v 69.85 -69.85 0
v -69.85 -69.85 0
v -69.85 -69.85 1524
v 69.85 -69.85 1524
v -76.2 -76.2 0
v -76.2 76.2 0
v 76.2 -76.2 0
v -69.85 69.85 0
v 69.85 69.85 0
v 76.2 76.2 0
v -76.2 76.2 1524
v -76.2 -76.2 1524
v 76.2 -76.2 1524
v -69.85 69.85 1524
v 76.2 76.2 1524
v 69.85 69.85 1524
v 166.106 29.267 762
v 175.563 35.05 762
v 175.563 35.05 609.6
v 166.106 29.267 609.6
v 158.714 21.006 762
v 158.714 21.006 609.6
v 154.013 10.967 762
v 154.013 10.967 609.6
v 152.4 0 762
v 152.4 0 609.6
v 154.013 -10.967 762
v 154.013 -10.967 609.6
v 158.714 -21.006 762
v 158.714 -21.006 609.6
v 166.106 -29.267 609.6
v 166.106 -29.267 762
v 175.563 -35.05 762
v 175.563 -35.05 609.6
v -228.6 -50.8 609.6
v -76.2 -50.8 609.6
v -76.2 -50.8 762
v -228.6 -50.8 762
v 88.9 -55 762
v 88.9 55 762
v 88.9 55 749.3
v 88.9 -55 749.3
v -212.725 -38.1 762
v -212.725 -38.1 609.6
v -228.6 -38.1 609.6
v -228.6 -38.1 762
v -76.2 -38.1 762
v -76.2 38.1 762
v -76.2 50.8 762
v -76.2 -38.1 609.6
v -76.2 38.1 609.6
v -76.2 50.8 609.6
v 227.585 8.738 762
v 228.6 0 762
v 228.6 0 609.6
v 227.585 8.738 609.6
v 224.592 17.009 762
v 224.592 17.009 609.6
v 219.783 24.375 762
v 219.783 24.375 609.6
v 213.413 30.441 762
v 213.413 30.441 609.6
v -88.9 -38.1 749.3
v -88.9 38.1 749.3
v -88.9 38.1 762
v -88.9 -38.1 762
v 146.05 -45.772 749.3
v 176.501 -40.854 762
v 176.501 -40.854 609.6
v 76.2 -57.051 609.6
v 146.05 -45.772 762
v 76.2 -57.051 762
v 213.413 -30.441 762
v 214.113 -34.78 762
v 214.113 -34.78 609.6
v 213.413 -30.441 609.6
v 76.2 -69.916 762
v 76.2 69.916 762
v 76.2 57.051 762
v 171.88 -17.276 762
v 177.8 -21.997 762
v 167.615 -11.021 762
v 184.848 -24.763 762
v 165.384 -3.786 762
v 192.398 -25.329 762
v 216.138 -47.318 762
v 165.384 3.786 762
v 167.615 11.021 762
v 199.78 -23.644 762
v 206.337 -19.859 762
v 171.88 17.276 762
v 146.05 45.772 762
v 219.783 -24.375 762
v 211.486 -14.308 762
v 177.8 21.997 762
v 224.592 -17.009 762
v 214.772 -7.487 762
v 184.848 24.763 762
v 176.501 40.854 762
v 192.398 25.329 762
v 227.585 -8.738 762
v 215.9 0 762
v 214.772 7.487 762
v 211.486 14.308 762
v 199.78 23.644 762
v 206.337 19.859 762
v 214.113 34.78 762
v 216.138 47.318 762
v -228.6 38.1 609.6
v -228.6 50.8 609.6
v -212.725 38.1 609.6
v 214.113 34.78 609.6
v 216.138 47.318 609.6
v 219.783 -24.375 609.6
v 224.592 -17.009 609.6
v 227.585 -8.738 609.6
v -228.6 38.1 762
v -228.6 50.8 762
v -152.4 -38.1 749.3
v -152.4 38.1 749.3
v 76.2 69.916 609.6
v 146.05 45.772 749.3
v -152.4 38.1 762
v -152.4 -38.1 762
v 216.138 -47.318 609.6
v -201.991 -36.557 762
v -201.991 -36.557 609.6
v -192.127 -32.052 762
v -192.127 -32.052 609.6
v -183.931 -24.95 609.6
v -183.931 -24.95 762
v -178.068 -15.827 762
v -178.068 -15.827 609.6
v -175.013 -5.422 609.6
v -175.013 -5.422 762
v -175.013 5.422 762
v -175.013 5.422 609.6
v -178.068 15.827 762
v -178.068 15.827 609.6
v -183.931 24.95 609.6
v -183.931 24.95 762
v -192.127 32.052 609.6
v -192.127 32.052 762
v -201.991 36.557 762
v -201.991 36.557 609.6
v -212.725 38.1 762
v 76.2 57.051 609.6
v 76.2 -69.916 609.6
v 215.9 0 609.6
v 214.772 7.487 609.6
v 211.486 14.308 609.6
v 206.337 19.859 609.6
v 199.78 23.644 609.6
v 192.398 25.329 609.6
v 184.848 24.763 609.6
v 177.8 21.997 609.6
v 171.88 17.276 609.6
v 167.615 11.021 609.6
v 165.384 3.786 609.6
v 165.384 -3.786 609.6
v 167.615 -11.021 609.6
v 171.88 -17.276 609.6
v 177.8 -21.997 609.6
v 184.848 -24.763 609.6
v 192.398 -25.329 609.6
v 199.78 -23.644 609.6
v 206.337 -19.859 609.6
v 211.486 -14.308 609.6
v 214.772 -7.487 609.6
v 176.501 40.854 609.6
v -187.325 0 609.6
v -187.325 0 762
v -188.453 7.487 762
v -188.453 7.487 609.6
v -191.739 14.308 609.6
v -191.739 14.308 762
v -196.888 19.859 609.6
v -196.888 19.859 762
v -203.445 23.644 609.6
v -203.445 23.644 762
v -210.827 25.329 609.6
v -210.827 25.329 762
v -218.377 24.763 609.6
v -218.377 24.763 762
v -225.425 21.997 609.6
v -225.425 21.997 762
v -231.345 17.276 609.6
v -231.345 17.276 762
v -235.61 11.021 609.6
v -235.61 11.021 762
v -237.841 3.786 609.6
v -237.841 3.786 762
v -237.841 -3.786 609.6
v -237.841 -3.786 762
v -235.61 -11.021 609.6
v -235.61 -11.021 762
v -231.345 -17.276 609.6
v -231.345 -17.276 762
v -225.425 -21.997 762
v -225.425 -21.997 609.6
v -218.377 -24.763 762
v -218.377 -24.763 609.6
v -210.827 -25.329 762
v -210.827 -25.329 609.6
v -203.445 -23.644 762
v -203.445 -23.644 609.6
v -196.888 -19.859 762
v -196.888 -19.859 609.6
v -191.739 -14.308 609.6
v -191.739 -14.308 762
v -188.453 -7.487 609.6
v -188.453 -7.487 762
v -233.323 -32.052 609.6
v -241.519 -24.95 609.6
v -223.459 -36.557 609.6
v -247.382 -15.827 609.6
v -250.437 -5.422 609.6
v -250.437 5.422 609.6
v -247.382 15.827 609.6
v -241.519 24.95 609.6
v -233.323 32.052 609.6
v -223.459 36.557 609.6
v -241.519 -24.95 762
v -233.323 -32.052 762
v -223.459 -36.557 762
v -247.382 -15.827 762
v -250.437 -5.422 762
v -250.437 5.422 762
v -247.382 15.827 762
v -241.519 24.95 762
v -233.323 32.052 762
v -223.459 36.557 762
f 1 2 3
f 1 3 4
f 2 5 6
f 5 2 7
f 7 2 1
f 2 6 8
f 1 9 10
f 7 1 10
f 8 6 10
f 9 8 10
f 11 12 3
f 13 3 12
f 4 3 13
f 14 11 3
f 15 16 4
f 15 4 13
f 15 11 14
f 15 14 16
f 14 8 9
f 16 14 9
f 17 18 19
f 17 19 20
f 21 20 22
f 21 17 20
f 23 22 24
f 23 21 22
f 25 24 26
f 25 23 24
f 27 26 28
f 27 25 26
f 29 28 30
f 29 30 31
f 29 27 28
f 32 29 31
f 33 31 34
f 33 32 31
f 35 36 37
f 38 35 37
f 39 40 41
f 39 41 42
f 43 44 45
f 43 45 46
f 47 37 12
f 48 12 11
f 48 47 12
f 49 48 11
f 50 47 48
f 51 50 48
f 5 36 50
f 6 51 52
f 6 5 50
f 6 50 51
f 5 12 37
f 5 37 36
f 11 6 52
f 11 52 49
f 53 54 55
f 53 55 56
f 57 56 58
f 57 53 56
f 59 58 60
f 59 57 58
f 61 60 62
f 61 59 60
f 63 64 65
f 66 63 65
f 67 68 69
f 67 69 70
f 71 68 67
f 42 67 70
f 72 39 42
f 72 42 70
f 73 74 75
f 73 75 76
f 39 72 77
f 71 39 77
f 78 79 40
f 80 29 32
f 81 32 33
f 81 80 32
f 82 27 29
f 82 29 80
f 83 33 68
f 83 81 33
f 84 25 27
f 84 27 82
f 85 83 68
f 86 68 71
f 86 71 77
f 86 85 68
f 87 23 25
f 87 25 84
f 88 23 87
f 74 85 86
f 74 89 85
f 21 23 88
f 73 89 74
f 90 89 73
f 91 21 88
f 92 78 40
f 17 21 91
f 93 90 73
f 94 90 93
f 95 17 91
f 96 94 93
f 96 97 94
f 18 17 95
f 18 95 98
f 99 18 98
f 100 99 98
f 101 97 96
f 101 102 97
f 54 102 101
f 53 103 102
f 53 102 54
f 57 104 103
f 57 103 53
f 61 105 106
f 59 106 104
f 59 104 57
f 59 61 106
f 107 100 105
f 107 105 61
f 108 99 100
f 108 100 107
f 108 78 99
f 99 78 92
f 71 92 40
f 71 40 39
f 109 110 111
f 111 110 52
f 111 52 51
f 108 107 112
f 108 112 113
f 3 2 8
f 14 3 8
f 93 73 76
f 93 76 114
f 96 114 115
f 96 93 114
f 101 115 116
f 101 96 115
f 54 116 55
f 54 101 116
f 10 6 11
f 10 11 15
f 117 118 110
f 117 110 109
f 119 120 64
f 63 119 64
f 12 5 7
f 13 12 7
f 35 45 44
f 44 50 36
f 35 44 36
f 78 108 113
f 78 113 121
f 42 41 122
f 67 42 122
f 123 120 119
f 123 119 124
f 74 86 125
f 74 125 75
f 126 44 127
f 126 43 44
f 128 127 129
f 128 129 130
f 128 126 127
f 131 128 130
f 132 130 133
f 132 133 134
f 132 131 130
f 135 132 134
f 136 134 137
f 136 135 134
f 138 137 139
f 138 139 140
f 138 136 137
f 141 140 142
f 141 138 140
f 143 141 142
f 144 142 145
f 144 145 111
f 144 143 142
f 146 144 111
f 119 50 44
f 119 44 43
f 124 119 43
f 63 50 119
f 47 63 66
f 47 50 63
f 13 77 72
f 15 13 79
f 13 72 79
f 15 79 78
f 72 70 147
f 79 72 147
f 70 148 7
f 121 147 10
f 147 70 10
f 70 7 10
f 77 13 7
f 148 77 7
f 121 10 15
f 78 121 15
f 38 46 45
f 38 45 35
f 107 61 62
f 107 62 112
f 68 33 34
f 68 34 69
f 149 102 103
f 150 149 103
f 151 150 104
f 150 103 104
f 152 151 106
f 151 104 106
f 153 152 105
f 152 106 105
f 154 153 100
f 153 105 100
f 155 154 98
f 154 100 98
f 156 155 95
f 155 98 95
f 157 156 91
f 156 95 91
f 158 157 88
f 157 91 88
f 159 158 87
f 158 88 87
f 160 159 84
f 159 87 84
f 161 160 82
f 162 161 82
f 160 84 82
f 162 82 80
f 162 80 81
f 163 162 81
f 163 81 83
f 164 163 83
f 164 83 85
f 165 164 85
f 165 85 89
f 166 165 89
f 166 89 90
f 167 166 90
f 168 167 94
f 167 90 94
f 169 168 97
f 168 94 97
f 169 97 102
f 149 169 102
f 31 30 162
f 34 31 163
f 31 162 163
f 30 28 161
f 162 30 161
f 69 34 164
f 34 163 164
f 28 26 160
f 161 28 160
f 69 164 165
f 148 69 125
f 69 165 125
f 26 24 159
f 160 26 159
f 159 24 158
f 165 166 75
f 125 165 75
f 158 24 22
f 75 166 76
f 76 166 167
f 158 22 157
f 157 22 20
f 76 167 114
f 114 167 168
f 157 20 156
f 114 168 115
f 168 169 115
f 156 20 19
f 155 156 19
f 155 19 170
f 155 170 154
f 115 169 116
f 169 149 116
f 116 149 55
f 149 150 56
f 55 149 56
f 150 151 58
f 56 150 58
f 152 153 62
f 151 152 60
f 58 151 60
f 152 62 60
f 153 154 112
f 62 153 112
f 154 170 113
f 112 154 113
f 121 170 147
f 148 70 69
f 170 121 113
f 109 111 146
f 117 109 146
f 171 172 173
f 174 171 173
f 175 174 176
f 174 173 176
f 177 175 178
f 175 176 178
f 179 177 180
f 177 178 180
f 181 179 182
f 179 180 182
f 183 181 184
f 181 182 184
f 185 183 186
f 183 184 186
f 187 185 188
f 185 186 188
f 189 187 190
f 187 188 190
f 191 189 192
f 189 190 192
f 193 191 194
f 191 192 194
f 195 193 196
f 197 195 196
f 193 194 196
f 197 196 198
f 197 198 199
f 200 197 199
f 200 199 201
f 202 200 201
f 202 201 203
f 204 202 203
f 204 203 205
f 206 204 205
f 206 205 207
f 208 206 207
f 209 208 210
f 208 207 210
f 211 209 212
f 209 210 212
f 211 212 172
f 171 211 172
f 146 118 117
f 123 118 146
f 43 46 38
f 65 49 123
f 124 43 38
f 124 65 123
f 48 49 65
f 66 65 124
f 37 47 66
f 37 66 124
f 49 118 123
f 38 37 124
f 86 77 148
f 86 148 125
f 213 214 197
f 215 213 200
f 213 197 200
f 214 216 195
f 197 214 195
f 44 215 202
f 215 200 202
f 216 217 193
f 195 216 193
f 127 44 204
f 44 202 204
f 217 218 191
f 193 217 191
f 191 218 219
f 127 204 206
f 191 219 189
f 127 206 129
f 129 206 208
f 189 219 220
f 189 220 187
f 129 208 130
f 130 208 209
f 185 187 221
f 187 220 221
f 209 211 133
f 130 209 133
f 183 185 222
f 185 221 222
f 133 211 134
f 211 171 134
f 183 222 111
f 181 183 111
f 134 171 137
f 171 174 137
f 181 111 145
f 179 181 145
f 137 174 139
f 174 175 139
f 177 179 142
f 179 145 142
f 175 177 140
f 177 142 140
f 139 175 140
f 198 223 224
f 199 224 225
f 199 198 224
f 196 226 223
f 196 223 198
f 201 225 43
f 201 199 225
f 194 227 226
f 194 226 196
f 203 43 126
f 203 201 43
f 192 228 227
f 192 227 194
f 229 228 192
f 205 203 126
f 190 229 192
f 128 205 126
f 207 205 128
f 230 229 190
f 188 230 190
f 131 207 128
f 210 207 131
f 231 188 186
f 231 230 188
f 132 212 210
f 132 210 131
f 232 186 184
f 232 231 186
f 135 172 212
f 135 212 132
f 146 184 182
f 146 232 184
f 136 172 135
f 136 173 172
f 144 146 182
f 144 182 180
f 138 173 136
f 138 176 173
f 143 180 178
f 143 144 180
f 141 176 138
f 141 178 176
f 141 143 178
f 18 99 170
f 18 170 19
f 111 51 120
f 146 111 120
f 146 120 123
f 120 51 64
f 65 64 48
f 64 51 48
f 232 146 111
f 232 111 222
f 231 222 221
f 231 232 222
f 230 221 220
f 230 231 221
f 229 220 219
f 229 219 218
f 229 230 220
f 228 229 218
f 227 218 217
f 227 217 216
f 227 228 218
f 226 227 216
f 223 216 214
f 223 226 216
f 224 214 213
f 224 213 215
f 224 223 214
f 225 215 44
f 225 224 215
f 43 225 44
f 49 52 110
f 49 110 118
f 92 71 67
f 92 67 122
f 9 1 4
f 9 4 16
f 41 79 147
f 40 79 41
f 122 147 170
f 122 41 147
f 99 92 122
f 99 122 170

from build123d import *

# Parameters (mm, degrees)
F0_W      = 152.4
F0_H      = 152.4
F0_W_2    = 139.7
F0_H_2    = 139.7
F1_DEPTH  = 1524
F2_W      = 12.7
F2_H      = 152.4
F3_DEPTH  = 152.4
F4_R      = 25.4
F5_DEPTH  = 152.4
F6_W      = 63.5
F6_H      = 12.7
F7_DEPTH  = 76.2
F8_R      = 25.4
F9_DEPTH  = 152.4
F11_DEPTH = 12.7


with BuildPart() as f1:
    # F0 (on Top) → F1 (new body)
    with BuildSketch(Plane.XY):
        Rectangle(F0_W, F0_H)
        Rectangle(F0_W_2, F0_H_2, mode=Mode.SUBTRACT)
    extrude(amount=F1_DEPTH)

    # F2 (on face) → F3 (join)
    with BuildSketch(Plane(origin=(-76.2, 0, 0), x_dir=(0, -1, 0), z_dir=(-1, 0, 0))):
        with Locations((-44.45, 685.8)):
            Rectangle(F2_W, F2_H)
        with Locations((44.45, 685.8)):
            Rectangle(F2_W, F2_H)
    extrude(amount=F3_DEPTH)

    # F4 (on face) → F5 (join)
    with BuildSketch(Plane.XY.offset(762)):
        with BuildLine():
            ThreePointArc((-212.725, 38.1), (-239.6657683632, -26.9407683632), (-174.625, 0))
            ThreePointArc((-174.625, 0), (-185.7842316368, 26.9407683632), (-212.725, 38.1))
        make_face()
        with Locations((-212.725, 0)):
            Circle(F4_R, mode=Mode.SUBTRACT)
    extrude(amount=-F5_DEPTH)

    # F6 (on face) → F7 (join, through all)
    with BuildSketch(Plane.XZ.offset(-38.1)):
        with Locations((-120.65, 755.65)):
            Rectangle(F6_W, F6_H)
    extrude(amount=F7_DEPTH)

    # F8 (on face) → F9 (join)
    with BuildSketch(Plane.XY.offset(762)):
        Polygon((76.2, 69.9156891741), (76.2, 57.0511658246), (176.5006458104, 40.8542386466), (196.5738473074, 37.612742241), (214.1133879894, 34.7803909548), (216.1380038866, 47.3179716812), align=None)
        with BuildLine():
            Line((196.5738473074, 37.612742241), (176.5006458104, 40.8542386466))
            Line((176.5006458104, 40.8542386466), (175.5633656917, 35.0500635597))
            ThreePointArc((175.5633656917, 35.0500635597), (185.8870748043, 37.8197160373), (196.5738473074, 37.612742241))
        make_face()
        with BuildLine():
            ThreePointArc((196.5738473074, 37.612742241), (205.4302812688, 35.0527702363), (213.4125666633, 30.4405040842))
            Line((213.4125666633, 30.4405040842), (214.1133879894, 34.7803909548))
            Line((214.1133879894, 34.7803909548), (196.5738473074, 37.612742241))
        make_face()
        with BuildLine():
            ThreePointArc((213.4125666633, -30.4405040842), (224.5923656401, -17.009426947), (228.6, 0))
            ThreePointArc((228.6, 0), (224.5923656401, 17.009426947), (213.4125666633, 30.4405040842))
            ThreePointArc((213.4125666633, 30.4405040842), (205.4302812688, 35.0527702363), (196.5738473074, 37.612742241))
            ThreePointArc((196.5738473074, 37.612742241), (185.8870748043, 37.8197160373), (175.5633656917, 35.0500635597))
            ThreePointArc((175.5633656917, 35.0500635597), (152.4, 0), (175.5633656917, -35.0500635597))
            ThreePointArc((175.5633656917, -35.0500635597), (185.887074699, -37.8197160244), (196.5738470979, -37.6127422748))
            ThreePointArc((196.5738470979, -37.6127422748), (205.4302811711, -35.0527702778), (213.4125666633, -30.4405040842))
        make_face()
        with Locations((190.5, 0)):
            Circle(F8_R, mode=Mode.SUBTRACT)
        with BuildLine():
            Line((196.5738470979, -37.6127422748), (214.1133879894, -34.7803909548))
            Line((214.1133879894, -34.7803909548), (213.4125666633, -30.4405040842))
            ThreePointArc((213.4125666633, -30.4405040842), (205.4302811711, -35.0527702778), (196.5738470979, -37.6127422748))
        make_face()
        with BuildLine():
            Line((175.5633656917, -35.0500635597), (176.5006458104, -40.8542386466))
            Line((176.5006458104, -40.8542386466), (196.5738470979, -37.6127422748))
            ThreePointArc((196.5738470979, -37.6127422748), (185.887074699, -37.8197160244), (175.5633656917, -35.0500635597))
        make_face()
        Polygon((76.2, -57.0511658246), (76.2, -69.9156891741), (216.1380038866, -47.3179716812), (214.1133879894, -34.7803909548), (196.5738470979, -37.6127422748), (176.5006458104, -40.8542386466), align=None)
    extrude(amount=-F9_DEPTH)

    # F10 (on face) → F11 (join)
    with BuildSketch(Plane.XY.offset(762)):
        Polygon((88.9, 55.0003218495), (88.9, -55.0003218495), (146.05, -45.7715239614), (146.05, 45.7715239614), align=None)
    extrude(amount=-F11_DEPTH)


solid = f1.part
